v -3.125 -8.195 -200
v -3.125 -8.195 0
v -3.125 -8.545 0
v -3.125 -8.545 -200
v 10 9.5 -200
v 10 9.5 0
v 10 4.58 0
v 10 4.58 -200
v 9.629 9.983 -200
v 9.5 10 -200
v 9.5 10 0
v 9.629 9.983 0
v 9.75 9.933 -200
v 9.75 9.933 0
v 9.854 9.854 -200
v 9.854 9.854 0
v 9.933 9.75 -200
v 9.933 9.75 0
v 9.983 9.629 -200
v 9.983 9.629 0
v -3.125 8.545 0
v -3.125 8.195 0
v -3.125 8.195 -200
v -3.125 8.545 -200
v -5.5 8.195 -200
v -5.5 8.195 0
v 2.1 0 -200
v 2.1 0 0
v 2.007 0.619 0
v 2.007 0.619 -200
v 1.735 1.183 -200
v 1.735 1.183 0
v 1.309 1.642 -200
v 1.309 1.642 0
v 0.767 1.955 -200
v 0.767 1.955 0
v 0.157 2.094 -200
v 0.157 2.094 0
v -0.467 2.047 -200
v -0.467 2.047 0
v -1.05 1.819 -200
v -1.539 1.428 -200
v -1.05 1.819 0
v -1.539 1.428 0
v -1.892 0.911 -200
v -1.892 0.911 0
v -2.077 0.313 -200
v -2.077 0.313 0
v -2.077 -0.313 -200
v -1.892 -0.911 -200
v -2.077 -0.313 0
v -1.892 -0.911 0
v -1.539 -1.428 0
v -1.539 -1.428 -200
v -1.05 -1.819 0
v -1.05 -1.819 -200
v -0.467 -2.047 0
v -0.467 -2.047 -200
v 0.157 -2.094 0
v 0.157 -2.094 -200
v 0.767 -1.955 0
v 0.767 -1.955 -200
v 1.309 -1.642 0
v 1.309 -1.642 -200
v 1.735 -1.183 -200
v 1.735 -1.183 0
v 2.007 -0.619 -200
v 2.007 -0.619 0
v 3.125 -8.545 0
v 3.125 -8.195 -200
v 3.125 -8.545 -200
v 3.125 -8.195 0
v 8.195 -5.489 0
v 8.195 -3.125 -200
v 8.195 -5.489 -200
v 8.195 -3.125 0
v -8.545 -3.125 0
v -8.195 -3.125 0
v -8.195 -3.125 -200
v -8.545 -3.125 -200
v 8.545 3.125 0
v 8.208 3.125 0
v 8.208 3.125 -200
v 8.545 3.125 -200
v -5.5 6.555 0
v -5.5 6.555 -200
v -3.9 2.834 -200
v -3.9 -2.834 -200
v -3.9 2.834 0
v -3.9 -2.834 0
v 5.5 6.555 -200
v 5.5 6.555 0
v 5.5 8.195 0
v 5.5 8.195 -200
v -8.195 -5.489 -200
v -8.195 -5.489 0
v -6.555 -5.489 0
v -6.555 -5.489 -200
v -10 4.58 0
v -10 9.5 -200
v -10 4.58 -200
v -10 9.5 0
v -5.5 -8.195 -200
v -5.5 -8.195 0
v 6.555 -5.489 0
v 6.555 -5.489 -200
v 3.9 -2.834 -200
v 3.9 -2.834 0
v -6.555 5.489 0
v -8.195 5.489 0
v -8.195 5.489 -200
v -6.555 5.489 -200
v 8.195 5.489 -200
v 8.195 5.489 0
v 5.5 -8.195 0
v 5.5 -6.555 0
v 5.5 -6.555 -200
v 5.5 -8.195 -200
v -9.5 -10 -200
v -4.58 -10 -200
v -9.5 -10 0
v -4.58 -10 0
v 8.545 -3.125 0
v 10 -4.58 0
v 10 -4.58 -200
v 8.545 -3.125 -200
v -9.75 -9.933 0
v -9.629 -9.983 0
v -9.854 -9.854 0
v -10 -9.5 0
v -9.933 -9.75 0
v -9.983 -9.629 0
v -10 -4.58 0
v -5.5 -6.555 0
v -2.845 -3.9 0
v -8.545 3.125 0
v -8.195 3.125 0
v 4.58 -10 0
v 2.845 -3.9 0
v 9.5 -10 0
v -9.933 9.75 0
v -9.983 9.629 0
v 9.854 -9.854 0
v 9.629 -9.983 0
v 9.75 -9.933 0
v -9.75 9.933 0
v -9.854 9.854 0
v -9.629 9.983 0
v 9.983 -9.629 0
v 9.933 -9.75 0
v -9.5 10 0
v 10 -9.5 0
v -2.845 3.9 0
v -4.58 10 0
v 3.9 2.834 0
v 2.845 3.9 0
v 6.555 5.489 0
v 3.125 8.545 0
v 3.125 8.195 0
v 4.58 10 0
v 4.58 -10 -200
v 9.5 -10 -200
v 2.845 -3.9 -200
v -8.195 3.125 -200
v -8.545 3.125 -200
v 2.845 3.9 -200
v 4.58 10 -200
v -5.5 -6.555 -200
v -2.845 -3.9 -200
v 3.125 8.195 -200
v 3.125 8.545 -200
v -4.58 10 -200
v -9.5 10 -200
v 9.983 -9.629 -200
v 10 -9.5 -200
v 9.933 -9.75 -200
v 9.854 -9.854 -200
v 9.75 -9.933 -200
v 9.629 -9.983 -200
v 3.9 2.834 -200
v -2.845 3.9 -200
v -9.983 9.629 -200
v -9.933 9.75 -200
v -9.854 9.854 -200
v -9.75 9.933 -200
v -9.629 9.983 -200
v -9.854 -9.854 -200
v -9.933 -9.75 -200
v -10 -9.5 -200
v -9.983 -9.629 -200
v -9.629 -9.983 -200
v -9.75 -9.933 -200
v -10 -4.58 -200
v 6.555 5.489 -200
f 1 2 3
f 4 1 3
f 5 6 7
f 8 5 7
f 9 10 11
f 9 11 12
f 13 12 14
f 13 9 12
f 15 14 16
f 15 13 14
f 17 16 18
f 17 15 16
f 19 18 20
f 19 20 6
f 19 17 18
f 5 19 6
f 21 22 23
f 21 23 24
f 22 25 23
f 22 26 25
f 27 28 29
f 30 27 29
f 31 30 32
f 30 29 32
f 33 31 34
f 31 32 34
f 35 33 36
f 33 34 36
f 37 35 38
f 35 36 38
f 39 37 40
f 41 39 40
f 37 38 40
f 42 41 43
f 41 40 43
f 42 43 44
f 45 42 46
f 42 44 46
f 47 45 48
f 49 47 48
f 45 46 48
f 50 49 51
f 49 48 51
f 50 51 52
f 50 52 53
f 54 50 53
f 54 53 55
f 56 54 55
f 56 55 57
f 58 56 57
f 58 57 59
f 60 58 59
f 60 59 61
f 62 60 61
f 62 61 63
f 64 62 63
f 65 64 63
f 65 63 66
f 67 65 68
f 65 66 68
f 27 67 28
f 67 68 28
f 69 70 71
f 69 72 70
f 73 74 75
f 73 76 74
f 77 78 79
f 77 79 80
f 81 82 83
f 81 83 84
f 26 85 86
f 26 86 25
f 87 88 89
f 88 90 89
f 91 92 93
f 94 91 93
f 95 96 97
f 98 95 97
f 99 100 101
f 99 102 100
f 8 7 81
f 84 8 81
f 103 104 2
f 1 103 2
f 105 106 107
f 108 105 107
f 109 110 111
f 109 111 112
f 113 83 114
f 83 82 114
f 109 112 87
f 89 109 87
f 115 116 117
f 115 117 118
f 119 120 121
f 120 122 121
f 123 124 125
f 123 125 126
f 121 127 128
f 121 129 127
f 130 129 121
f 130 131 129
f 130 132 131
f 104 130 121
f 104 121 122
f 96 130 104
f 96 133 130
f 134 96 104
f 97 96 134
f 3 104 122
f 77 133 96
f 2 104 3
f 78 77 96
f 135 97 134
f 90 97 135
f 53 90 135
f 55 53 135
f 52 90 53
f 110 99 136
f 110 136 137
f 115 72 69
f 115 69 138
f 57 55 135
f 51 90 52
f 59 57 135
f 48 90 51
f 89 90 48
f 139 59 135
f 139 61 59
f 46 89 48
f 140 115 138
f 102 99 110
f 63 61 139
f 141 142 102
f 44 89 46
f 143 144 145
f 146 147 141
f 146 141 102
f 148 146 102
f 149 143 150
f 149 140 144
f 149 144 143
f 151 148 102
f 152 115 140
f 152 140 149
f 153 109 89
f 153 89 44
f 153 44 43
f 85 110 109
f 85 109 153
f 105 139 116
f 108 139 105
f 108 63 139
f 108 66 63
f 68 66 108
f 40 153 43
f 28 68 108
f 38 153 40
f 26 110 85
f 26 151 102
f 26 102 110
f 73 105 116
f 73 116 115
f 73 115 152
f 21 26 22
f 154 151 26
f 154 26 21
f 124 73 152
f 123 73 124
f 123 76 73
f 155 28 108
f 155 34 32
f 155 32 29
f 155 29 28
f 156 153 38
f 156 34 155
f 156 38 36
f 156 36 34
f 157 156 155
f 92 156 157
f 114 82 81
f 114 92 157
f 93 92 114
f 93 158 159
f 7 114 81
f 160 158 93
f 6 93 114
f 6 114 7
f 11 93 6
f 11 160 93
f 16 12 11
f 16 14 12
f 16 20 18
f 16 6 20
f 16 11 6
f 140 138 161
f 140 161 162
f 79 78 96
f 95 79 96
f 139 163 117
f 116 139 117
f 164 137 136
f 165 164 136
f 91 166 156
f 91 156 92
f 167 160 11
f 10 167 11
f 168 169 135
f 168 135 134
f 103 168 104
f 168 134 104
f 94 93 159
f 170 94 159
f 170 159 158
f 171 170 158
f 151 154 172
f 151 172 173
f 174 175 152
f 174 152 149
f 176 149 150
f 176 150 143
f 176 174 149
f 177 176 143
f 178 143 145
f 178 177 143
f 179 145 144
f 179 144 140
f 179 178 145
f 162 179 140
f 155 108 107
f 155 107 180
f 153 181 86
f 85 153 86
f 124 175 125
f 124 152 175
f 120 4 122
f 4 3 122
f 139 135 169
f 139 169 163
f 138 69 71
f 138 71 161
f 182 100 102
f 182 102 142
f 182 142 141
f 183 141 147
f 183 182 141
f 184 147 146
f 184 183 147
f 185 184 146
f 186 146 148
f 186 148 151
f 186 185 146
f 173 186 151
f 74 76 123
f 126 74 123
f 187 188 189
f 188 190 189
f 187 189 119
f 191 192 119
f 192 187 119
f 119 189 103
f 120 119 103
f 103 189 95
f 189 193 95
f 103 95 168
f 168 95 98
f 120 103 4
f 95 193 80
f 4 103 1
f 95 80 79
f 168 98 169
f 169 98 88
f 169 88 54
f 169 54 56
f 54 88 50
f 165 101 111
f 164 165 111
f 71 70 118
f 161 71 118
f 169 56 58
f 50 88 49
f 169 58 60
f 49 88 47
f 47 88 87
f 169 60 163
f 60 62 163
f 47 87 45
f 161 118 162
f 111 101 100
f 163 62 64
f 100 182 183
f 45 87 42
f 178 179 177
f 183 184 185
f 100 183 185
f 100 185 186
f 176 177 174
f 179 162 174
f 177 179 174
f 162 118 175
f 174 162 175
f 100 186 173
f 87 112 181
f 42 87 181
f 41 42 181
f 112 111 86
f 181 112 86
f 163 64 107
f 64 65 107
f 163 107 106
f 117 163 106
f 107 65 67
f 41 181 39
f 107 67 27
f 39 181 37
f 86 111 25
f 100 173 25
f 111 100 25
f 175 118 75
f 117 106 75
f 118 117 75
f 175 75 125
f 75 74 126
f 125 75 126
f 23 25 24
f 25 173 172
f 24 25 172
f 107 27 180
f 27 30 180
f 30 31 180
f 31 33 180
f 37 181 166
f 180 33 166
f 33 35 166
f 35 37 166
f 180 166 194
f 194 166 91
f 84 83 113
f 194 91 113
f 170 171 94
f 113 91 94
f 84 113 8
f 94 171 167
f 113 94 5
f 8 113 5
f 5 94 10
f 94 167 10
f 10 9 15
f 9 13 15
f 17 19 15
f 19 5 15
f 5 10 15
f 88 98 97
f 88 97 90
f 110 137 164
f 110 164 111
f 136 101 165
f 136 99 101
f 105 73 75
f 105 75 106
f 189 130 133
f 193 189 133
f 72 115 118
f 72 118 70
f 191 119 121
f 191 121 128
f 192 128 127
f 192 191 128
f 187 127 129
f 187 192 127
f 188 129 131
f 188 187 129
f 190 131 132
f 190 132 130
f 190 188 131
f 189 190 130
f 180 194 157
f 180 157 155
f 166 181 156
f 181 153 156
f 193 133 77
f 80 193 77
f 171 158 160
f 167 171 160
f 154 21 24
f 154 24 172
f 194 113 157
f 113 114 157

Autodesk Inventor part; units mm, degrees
ref_plane "YZ Plane" through (0, 0, 0) normal (1, 0, 0) x (0, 1, 0)
ref_plane "XZ Plane" through (0, 0, 0) normal (0, 1, 0) x (-1, 0, 0)
ref_plane "XY Plane" through (0, 0, 0) normal (0, 0, 1) x (1, 0, 0)
sketch "Boceto1" plane through (0, 0, 0) normal (0, 0, 1) x (1, 0, 0)
  circle A0 centre (0, 0) radius 2.1
  line L0 (-12, 0) -> (12, 0)
  line L1 (0, 12) -> (0, -12)
  line L2 (0, 3.9) -> (-2.845, 3.9)
  line L3 (-2.845, 3.9) -> (-5.5, 6.555)
  line L4 (-5.5, 6.555) -> (-5.5, 8.195)
  line L5 (-5.5, 8.195) -> (-3.125, 8.195)
  line L6 (-3.125, 8.545) -> (-4.58, 10)
  line L7 (-4.58, 10) -> (-10, 10)
  line L8 (-10, 10) -> (-10, 4.58)
  line L9 (-10, 4.58) -> (-8.545, 3.125)
  line L10 (-8.195, 3.125) -> (-8.195, 5.4887)
  line L11 (-8.195, 5.4887) -> (-6.555, 5.4887)
  line L12 (-6.555, 5.4887) -> (-3.9, 2.8337)
  line L13 (-3.9, 2.8337) -> (-3.9, 0)
  line L14 (0, 3.9) -> (2.845, 3.9)
  line L15 (2.845, 3.9) -> (5.5, 6.555)
  line L16 (5.5, 6.555) -> (5.5, 8.195)
  line L17 (5.5, 8.195) -> (3.125, 8.195)
  line L18 (3.125, 8.545) -> (4.58, 10)
  line L19 (4.58, 10) -> (10, 10)
  line L20 (10, 10) -> (10, 4.58)
  line L21 (10, 4.58) -> (8.545, 3.125)
  line L22 (8.2079, 3.125) -> (8.195, 5.4887)
  line L23 (8.195, 5.4887) -> (6.555, 5.4887)
  line L24 (6.555, 5.4887) -> (3.9, 2.8337)
  line L25 (3.9, 2.8337) -> (3.9, 0)
  line L26 (0, -3.9) -> (-2.845, -3.9)
  line L27 (-2.845, -3.9) -> (-5.5, -6.555)
  line L28 (-5.5, -6.555) -> (-5.5, -8.195)
  line L29 (-5.5, -8.195) -> (-3.125, -8.195)
  line L30 (-3.125, -8.545) -> (-4.58, -10)
  line L31 (-4.58, -10) -> (-10, -10)
  line L32 (-10, -10) -> (-10, -4.58)
  line L33 (-10, -4.58) -> (-8.545, -3.125)
  line L34 (-8.195, -3.125) -> (-8.195, -5.4887)
  line L35 (-8.195, -5.4887) -> (-6.555, -5.4887)
  line L36 (-6.555, -5.4887) -> (-3.9, -2.8337)
  line L37 (-3.9, -2.8337) -> (-3.9, 0)
  line L38 (10, -10) -> (10, -4.58)
  line L39 (4.58, -10) -> (10, -10)
  line L40 (3.125, -8.545) -> (4.58, -10)
  line L41 (5.5, -8.195) -> (3.125, -8.195)
  line L42 (5.5, -6.555) -> (5.5, -8.195)
  line L43 (2.845, -3.9) -> (5.5, -6.555)
  line L44 (0, -3.9) -> (2.845, -3.9)
  line L45 (3.9, -2.8337) -> (3.9, 0)
  line L46 (6.555, -5.4887) -> (3.9, -2.8337)
  line L47 (8.195, -5.4887) -> (6.555, -5.4887)
  line L48 (8.195, -3.125) -> (8.195, -5.4887)
  line L49 (10, -4.58) -> (8.545, -3.125)
  line L50 (-3.125, 8.195) -> (-3.125, 8.545)
  line L51 (-8.195, 3.125) -> (-8.545, 3.125)
  line L52 (3.125, 8.195) -> (3.125, 8.545)
  line L53 (8.195, 3.125) -> (8.545, 3.125)
  line L54 (-3.125, -8.195) -> (-3.125, -8.545)
  line L55 (-8.195, -3.125) -> (-8.545, -3.125)
  line L56 (3.125, -8.195) -> (3.125, -8.545)
  line L57 (8.195, -3.125) -> (8.545, -3.125)
  dimension "d0" = 4.2
  dimension "d1" = 24
  dimension "d2" = 24
  dimension "d3" = 90
  dimension "d5" = 20
  dimension "d11" = 90
  dimension "d18" = 20
  dimension "d29" = 1.5
  dimension "d30" = 1.64
  dimension "d37" = 1.64
  dimension "d42" = 7.8
  dimension "d44" = 11
  dimension "d45" = 9.16
  dimension "d46" = 9.16
  dimension "d47" = 6.25
  dimension "d48" = 6.25
  dimension "d49" = 0.35
  dimension "d51" = 7.8
  dimension "d52" = 0.35
  dimension "d53" = 1.8
extrude "Extrusión1" add sketch "Boceto1" against normal blind 200 contours L0 L45 L46 L47 L48 L57 L49 L38 L39 L40 L56 L41 L42 L43 L44 L1 A0 | A0 L1 L14 L15 L16 L17 L52 L18 L19 L20 L21 L53 L22 L23 L24 L25 L0 | A0 L0 L13 L12 L11 L10 L51 L9 L8 L7 L6 L50 L5 L4 L3 L2 L1 | L1 L26 L27 L28 L29 L54 L30 L31 L32 L33 L55 L34 L35 L36 L37 L0 A0
fillet "Empalme1" radius 0.5 4 edges at (10, 10, -100) (-10, 10, -100) (10, -10, -100) (-10, -10, -100)
properties part number "Perfil2020" material "Aluminio 6061"
